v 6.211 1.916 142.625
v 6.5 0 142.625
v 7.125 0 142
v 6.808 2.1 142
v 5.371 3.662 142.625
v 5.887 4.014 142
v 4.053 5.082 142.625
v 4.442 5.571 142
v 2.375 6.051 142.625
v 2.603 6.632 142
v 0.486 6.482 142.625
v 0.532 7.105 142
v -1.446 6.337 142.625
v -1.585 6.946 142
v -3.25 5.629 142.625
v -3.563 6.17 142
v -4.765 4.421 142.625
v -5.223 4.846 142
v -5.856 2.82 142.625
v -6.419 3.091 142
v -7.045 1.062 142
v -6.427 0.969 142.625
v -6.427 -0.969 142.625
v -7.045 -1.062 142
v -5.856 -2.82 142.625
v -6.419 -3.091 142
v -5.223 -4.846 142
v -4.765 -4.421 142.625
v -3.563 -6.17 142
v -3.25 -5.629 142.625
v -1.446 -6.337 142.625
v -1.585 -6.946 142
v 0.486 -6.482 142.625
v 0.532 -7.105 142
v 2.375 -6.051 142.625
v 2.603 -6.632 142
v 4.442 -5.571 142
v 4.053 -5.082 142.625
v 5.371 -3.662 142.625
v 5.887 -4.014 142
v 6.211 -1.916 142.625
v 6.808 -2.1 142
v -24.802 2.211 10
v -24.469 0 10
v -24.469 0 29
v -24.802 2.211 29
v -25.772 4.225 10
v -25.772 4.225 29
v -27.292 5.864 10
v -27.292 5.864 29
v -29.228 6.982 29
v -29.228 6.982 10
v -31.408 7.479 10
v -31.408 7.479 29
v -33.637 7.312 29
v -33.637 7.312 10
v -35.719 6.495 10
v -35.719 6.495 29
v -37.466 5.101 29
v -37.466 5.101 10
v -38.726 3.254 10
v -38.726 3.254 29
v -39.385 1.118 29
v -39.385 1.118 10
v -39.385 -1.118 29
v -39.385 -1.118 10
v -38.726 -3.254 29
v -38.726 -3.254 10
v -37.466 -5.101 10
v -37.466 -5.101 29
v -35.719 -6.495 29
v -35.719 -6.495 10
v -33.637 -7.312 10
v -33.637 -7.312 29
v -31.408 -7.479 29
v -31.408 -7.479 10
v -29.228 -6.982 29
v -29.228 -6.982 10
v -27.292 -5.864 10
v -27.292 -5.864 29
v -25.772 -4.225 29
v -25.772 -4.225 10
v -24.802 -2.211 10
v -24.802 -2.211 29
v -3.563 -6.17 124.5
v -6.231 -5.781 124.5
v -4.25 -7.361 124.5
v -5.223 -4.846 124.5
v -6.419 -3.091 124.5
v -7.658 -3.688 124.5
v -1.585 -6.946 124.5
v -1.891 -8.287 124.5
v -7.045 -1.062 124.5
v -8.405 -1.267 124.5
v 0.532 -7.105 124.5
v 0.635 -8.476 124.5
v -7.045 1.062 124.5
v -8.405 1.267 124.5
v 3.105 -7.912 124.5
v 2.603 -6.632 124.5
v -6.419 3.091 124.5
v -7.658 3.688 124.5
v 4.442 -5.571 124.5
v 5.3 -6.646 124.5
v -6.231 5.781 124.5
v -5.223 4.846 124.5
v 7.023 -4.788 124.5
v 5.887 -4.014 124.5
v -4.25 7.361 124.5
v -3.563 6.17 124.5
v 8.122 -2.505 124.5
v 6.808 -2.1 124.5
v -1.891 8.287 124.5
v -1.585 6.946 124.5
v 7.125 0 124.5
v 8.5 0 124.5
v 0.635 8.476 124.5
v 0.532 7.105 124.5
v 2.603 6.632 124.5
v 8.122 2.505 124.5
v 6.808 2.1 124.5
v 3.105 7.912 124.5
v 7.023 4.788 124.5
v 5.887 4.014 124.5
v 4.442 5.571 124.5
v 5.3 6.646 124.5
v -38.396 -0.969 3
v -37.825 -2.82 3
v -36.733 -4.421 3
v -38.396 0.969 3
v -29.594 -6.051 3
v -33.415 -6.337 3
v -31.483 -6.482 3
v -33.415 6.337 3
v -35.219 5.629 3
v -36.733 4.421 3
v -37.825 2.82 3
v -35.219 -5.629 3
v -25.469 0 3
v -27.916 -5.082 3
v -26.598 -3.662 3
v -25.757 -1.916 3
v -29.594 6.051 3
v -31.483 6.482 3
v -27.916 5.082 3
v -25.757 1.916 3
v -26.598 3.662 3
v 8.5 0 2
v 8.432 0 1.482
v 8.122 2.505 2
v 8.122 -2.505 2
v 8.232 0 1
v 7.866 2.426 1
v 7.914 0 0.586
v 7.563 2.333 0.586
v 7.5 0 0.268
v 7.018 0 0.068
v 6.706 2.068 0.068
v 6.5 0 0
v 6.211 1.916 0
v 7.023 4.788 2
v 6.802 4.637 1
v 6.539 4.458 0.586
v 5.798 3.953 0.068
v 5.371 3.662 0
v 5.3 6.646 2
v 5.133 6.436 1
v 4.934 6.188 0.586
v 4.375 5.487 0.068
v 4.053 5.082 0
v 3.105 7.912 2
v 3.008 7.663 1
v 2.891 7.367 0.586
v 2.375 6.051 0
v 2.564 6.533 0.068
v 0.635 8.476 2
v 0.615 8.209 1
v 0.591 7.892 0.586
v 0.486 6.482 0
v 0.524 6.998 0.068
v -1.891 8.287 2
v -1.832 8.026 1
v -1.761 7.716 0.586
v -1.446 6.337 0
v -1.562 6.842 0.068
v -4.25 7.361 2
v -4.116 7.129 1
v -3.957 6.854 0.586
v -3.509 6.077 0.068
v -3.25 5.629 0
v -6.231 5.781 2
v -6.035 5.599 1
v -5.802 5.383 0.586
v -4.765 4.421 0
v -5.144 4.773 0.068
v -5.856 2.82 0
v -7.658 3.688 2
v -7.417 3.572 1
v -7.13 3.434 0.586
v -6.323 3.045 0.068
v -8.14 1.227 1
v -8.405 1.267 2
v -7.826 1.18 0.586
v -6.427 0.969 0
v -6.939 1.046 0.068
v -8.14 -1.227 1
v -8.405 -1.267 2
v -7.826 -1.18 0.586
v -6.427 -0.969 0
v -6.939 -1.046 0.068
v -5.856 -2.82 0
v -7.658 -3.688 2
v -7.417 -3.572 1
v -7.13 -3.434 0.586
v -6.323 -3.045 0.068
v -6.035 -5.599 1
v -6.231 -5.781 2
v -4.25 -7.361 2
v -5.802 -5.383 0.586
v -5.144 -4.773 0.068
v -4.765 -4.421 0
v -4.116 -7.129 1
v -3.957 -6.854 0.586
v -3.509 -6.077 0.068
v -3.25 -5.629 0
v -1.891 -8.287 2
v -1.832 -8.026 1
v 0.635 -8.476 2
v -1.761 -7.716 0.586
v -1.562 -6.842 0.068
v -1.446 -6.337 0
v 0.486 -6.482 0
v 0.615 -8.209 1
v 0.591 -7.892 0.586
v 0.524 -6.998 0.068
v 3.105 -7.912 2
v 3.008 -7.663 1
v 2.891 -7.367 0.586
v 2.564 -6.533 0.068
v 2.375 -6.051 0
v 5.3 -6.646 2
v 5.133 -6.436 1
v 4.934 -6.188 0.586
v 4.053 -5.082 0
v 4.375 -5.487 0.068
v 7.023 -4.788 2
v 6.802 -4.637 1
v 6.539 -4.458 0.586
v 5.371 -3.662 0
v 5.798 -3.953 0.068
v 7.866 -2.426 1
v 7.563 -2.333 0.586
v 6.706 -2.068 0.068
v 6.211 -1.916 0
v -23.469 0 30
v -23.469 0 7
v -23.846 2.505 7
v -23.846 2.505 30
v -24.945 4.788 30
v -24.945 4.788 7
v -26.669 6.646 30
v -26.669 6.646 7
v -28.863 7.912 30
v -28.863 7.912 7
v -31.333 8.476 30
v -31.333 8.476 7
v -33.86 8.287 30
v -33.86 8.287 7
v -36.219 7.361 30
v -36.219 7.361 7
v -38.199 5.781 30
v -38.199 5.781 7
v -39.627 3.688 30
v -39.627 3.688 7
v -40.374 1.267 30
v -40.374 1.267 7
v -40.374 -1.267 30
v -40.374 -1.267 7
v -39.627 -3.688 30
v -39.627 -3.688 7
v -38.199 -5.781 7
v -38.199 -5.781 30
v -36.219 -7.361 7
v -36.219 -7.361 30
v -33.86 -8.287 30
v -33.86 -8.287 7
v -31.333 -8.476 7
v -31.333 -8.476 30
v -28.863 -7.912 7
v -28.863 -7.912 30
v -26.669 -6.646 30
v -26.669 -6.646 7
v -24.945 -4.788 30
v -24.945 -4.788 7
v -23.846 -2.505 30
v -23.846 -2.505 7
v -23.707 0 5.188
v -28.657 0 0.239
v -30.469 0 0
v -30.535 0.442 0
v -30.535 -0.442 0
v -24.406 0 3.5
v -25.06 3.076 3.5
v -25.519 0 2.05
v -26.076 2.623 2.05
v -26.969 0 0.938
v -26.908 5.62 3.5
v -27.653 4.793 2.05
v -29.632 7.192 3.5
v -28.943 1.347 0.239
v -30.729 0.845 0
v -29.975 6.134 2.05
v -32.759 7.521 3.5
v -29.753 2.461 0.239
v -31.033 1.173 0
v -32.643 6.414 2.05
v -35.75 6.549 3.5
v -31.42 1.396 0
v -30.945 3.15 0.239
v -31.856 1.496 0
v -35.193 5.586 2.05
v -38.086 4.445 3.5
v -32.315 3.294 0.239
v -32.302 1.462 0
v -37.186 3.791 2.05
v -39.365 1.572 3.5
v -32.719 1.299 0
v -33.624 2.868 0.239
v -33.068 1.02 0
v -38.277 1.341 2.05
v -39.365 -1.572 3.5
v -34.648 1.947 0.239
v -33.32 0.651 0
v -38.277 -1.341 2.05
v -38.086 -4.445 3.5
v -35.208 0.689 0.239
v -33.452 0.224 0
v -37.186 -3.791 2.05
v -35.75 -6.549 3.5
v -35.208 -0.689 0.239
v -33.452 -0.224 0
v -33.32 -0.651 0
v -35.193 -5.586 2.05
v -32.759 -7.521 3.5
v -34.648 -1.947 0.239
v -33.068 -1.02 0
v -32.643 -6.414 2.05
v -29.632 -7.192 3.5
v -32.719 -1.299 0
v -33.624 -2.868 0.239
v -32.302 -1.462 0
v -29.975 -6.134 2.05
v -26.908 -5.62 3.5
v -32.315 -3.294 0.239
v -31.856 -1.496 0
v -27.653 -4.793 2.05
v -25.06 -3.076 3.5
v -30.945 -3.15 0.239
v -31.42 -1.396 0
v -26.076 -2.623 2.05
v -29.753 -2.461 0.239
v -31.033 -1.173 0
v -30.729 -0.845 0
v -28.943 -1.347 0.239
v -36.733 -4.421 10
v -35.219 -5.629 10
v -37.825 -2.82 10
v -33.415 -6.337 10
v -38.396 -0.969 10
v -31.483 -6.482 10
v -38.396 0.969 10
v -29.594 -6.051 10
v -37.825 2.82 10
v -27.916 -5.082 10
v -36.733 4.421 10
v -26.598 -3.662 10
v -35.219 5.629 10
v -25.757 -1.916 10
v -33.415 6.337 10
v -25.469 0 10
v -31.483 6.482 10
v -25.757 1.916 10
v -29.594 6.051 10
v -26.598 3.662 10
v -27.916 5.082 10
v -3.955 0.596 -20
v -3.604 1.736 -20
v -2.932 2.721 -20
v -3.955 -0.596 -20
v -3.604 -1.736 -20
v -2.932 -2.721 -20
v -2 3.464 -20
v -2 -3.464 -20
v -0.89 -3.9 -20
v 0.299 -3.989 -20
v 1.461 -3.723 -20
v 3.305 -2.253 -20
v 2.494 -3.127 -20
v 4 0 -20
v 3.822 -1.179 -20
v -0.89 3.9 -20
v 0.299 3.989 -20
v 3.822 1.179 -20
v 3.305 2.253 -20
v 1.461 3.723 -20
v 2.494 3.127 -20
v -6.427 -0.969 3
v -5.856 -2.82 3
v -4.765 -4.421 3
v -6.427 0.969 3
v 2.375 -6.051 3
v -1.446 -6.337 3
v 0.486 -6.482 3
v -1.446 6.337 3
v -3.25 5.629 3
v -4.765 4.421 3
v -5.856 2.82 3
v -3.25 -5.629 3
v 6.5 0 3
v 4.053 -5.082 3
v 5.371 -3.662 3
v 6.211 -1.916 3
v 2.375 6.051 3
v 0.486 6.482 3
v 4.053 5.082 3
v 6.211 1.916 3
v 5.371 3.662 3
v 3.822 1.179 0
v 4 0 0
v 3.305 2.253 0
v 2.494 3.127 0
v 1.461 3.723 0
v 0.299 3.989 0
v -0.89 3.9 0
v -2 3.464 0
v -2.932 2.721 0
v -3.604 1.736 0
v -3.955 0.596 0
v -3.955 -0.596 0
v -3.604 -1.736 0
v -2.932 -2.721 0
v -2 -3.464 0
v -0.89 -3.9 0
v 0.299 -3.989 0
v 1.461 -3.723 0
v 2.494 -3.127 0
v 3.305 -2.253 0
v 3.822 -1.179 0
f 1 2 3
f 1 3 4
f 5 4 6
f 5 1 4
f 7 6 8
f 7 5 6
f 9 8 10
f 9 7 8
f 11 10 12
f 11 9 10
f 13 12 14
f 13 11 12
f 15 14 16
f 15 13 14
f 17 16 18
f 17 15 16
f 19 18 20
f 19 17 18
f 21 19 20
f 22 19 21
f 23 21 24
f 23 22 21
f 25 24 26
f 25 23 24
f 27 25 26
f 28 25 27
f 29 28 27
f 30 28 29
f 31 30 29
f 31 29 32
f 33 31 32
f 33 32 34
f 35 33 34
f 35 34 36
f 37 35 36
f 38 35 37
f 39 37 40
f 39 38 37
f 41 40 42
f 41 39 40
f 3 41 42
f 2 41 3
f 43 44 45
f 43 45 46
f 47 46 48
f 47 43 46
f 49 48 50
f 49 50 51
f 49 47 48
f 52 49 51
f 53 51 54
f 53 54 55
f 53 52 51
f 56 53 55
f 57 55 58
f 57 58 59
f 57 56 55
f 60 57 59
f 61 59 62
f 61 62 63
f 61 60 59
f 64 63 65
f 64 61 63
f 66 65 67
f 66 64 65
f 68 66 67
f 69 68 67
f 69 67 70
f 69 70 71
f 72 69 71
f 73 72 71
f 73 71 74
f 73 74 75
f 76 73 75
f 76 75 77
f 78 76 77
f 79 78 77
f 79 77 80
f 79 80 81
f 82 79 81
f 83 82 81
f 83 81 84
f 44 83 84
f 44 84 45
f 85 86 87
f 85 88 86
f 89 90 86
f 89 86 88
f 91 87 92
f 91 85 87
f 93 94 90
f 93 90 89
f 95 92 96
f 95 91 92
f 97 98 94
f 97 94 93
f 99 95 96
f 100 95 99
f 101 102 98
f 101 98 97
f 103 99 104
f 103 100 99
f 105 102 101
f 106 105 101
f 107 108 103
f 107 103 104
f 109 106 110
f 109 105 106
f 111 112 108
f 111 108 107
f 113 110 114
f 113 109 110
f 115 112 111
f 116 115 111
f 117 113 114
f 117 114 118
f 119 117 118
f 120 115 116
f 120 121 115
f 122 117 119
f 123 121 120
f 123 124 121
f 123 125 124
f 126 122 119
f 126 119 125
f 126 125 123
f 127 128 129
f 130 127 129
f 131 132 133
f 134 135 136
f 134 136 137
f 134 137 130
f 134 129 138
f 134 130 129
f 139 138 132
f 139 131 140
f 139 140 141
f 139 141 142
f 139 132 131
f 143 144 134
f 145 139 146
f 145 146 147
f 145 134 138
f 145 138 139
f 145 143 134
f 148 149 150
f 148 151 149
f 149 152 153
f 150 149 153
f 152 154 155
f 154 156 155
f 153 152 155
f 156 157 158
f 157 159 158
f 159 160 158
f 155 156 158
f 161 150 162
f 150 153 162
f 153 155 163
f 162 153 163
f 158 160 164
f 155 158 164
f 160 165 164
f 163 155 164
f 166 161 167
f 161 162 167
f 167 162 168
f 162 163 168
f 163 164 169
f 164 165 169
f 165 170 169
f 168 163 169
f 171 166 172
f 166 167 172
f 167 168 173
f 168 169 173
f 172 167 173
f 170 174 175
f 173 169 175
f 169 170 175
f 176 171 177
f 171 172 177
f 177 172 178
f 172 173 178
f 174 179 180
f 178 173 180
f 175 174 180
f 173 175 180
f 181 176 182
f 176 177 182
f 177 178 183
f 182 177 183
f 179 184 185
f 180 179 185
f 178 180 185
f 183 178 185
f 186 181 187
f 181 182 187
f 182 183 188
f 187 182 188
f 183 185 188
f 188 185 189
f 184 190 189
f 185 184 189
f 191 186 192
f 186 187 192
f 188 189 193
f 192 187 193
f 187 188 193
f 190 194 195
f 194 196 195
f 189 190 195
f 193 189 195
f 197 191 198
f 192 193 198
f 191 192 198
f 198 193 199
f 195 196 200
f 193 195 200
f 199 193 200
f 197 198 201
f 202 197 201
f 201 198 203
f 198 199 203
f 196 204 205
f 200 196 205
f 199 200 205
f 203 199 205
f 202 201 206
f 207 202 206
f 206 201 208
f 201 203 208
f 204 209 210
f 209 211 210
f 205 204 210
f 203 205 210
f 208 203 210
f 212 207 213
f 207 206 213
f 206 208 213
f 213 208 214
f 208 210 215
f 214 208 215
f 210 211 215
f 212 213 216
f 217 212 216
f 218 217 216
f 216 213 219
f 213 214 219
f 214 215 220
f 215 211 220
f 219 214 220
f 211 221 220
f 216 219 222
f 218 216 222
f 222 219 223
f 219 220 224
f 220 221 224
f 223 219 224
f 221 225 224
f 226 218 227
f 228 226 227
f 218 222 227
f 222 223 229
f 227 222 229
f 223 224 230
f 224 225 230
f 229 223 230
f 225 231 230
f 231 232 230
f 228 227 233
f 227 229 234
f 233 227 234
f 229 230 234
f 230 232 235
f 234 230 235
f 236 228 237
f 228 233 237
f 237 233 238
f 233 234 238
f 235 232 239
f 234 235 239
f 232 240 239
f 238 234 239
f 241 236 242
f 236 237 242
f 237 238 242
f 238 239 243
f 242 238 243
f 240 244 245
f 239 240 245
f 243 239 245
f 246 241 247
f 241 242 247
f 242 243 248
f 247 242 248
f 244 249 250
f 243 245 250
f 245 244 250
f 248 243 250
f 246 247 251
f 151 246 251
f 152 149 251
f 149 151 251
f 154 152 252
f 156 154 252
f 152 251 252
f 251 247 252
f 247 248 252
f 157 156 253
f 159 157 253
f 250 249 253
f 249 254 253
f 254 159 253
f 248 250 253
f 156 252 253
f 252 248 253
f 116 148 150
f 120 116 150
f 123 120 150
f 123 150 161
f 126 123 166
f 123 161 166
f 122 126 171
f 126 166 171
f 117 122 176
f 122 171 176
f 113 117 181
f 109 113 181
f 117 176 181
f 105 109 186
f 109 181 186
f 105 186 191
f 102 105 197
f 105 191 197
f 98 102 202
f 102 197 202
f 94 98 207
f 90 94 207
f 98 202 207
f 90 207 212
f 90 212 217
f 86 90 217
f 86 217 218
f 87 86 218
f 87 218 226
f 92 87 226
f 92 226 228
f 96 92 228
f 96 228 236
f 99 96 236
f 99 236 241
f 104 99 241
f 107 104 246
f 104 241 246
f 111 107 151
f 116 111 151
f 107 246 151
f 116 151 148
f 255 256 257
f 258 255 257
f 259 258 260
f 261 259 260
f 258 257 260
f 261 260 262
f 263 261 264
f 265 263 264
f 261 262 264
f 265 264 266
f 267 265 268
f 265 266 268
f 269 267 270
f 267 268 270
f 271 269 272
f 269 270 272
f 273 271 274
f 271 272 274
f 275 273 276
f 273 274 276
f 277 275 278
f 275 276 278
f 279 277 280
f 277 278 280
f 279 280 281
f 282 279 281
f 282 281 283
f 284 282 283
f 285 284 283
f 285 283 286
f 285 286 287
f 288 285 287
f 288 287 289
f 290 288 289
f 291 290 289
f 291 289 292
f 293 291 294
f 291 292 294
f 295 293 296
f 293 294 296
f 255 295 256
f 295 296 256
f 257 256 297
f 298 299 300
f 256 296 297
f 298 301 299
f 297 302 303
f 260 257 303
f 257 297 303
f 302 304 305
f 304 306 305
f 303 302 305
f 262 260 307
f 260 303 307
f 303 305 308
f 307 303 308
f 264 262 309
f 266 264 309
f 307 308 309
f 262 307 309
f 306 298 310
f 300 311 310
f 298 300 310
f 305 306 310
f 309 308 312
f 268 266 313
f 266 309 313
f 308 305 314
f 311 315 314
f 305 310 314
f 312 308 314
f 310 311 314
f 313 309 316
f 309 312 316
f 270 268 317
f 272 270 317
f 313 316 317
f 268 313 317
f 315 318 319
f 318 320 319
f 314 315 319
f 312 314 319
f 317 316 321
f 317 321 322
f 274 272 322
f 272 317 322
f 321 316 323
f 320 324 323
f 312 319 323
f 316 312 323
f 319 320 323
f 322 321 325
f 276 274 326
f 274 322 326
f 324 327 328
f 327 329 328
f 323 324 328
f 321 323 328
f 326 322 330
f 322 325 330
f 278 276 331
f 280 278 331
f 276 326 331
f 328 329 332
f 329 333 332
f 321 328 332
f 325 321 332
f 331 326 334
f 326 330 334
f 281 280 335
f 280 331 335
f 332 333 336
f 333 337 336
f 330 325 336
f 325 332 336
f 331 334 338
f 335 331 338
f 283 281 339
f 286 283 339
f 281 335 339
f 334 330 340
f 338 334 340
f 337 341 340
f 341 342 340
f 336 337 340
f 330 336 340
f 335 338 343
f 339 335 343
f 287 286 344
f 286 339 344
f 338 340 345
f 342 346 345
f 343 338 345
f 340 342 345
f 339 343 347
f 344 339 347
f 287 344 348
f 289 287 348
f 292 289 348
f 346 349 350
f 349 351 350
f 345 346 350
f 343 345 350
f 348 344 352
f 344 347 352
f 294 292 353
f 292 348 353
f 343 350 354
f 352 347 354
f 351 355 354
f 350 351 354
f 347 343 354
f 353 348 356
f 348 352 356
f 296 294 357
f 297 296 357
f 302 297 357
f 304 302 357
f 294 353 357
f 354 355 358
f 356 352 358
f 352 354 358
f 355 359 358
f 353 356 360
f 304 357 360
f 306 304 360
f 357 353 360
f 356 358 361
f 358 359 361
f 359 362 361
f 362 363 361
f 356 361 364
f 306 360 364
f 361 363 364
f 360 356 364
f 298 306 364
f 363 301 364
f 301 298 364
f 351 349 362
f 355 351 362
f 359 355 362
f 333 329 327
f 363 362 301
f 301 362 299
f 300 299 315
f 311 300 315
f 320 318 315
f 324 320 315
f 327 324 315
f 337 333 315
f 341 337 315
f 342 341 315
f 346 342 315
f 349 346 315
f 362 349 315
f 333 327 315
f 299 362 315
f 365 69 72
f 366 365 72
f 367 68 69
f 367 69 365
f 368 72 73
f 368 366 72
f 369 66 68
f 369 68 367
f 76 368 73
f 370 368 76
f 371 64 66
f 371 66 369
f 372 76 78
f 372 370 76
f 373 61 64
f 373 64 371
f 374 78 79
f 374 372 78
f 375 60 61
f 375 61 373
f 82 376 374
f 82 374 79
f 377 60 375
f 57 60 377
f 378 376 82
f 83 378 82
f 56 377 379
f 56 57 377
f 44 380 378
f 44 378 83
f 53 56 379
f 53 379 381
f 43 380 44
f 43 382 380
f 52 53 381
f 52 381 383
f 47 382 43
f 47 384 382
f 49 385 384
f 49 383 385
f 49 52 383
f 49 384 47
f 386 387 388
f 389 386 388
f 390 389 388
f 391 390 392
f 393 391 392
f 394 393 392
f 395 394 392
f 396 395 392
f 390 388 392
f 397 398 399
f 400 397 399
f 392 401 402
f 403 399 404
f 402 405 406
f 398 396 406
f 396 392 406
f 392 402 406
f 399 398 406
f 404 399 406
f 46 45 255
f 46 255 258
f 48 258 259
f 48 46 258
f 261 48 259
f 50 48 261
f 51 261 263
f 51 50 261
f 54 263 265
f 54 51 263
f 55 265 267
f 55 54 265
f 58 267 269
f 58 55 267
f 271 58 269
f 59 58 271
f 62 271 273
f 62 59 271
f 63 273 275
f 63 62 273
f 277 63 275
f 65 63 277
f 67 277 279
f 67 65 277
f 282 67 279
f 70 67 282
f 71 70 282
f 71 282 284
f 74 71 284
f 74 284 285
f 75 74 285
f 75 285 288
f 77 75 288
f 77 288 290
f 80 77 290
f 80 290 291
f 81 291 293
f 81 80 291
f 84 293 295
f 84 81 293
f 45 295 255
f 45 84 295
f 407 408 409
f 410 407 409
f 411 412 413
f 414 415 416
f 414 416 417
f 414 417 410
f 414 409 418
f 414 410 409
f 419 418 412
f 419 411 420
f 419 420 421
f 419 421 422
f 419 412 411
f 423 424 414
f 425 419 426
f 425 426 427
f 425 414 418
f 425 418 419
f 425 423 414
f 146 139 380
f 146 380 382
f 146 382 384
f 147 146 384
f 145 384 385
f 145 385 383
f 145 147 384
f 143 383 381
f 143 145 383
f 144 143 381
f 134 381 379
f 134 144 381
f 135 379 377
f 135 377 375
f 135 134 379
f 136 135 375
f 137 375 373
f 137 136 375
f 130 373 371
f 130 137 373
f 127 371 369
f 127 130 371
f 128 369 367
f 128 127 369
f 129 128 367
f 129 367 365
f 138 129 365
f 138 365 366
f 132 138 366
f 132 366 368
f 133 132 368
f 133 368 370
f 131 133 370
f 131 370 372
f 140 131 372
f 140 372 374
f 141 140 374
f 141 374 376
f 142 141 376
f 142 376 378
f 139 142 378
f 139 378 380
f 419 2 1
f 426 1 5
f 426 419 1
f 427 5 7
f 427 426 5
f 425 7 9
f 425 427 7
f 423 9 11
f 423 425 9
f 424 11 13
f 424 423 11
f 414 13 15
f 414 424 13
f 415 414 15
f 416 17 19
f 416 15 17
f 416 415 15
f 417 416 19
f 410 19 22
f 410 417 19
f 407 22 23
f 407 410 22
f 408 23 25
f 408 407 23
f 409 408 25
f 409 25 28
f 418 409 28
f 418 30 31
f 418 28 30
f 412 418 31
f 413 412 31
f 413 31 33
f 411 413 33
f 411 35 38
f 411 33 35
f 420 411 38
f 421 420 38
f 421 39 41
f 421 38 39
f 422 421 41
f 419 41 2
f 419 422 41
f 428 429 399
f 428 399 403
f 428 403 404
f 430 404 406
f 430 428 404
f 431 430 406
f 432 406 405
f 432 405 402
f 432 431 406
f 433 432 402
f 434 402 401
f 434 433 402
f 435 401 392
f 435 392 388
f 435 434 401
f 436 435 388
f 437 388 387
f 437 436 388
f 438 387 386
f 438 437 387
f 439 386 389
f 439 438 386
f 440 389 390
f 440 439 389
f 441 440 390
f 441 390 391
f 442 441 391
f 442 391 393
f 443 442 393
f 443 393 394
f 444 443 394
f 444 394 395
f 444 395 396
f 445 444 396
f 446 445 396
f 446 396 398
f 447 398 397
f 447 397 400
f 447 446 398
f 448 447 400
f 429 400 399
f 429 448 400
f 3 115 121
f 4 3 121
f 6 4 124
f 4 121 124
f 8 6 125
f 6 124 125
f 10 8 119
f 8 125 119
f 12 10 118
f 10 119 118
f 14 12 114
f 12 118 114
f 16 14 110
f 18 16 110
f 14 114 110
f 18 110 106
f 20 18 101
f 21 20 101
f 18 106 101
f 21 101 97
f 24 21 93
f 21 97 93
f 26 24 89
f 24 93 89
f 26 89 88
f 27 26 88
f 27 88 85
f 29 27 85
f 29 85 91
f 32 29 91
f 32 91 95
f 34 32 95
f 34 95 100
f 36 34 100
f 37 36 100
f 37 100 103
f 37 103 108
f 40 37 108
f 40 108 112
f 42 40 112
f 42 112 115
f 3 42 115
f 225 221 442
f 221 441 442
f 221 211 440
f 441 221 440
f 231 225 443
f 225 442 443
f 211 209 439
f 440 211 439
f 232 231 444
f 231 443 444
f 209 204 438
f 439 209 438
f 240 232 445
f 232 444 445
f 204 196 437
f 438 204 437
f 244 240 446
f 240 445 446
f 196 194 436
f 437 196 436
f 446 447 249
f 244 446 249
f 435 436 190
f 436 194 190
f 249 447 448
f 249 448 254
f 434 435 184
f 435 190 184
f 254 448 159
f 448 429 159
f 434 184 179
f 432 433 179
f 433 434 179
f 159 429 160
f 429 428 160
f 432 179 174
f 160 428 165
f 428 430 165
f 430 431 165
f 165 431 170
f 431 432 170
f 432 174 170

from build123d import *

# Parameters (mm, degrees)
F0_R     = 6.5
F0_R_2   = 4
F1_DEPTH = 3
F0_R_3   = 7.5
F2_DEPTH = 10
F0_R_4   = 8.5
F3_DEPTH = 30
F0_R_5   = 7.125
F4_DEPTH = 143
F5_DEPTH = 124.5
F6_R     = 7
F7_R     = 2
F9_DEPTH = 20


# Not quite as in the source:
# - a fillet or chamfer that OpenCascade refuses, or shapes differently, is made with other operations: its cross-section is extruded or revolved along the edge and cut away or added


with BuildPart() as f1:
    # F0 (on Top) → F1 (new body)
    with BuildSketch(Plane.XY):
        Circle(F0_R)
        Circle(F0_R_2, mode=Mode.SUBTRACT)
        Circle(F0_R_2)
    extrude(amount=F1_DEPTH)

    # F0 (on Top) → F4 (join)
    with BuildSketch(Plane.XY):
        Circle(F0_R_5)
        Circle(F0_R, mode=Mode.SUBTRACT)
    extrude(amount=F4_DEPTH)

    # F0 (on Top) → F5 (join)
    with BuildSketch(Plane.XY):
        Circle(F0_R_4)
        Circle(F0_R_5, mode=Mode.SUBTRACT)
    extrude(amount=F5_DEPTH)

    # F7
    f7_edges = [f1.edges().sort_by_distance(p)[0] for p in [
        (-8.5, 0, 0),
    ]]
    fillet(f7_edges, radius=F7_R)

    # F8: chamfer of 1 on 1 edges, made by hand

    # F8_s1 → F8_t2 (revolve, cut)
    with BuildSketch(Plane.XZ):
        Polygon((7.125, 142), (6.125, 143), (7.125, 143), align=None)
    revolve(axis=Axis((0, 0, 143), (0, 0, 1)), mode=Mode.SUBTRACT)

    # F0 (on Top) → F9 (join)
    with BuildSketch(Plane.XY):
        Circle(F0_R_2)
    extrude(amount=-F9_DEPTH)


with BuildPart() as f1b:
    # F0 (on Top) → F1, piece 2 (new body)
    with BuildSketch(Plane.XY):
        with Locations((-31.9685041904, 0)):
            Circle(F0_R)
    extrude(amount=F1_DEPTH)

    # F0 (on Top) → F2 (join)
    with BuildSketch(Plane.XY):
        with Locations((-31.9685041904, 0)):
            Circle(F0_R_3)
        with Locations((-31.9685041904, 0)):
            Circle(F0_R, mode=Mode.SUBTRACT)
    extrude(amount=F2_DEPTH)

    # F0 (on Top) → F3 (join)
    with BuildSketch(Plane.XY):
        with Locations((-31.9685041904, 0)):
            Circle(F0_R_4)
        with Locations((-31.9685041904, 0)):
            Circle(F0_R_3, mode=Mode.SUBTRACT)
    extrude(amount=F3_DEPTH)

    # F6
    f6_edges = [f1b.edges().sort_by_distance(p)[0] for p in [
        (-40.468504, 0, 0),
    ]]
    fillet(f6_edges, radius=F6_R)

    # F8#2: chamfer of 1 on 1 edges, made by hand

    # F8_2_s1 → F8_2_t2 (revolve, cut)
    with BuildSketch(Plane.XZ):
        Polygon((-23.4685041904, 30), (-24.4685041904, 29), (-24.4685041904, 30), align=None)
    revolve(axis=Axis((-31.9685041904, 0, 30), (0, 0, 1)), mode=Mode.SUBTRACT)


solid = Compound([f1.part, f1b.part])
